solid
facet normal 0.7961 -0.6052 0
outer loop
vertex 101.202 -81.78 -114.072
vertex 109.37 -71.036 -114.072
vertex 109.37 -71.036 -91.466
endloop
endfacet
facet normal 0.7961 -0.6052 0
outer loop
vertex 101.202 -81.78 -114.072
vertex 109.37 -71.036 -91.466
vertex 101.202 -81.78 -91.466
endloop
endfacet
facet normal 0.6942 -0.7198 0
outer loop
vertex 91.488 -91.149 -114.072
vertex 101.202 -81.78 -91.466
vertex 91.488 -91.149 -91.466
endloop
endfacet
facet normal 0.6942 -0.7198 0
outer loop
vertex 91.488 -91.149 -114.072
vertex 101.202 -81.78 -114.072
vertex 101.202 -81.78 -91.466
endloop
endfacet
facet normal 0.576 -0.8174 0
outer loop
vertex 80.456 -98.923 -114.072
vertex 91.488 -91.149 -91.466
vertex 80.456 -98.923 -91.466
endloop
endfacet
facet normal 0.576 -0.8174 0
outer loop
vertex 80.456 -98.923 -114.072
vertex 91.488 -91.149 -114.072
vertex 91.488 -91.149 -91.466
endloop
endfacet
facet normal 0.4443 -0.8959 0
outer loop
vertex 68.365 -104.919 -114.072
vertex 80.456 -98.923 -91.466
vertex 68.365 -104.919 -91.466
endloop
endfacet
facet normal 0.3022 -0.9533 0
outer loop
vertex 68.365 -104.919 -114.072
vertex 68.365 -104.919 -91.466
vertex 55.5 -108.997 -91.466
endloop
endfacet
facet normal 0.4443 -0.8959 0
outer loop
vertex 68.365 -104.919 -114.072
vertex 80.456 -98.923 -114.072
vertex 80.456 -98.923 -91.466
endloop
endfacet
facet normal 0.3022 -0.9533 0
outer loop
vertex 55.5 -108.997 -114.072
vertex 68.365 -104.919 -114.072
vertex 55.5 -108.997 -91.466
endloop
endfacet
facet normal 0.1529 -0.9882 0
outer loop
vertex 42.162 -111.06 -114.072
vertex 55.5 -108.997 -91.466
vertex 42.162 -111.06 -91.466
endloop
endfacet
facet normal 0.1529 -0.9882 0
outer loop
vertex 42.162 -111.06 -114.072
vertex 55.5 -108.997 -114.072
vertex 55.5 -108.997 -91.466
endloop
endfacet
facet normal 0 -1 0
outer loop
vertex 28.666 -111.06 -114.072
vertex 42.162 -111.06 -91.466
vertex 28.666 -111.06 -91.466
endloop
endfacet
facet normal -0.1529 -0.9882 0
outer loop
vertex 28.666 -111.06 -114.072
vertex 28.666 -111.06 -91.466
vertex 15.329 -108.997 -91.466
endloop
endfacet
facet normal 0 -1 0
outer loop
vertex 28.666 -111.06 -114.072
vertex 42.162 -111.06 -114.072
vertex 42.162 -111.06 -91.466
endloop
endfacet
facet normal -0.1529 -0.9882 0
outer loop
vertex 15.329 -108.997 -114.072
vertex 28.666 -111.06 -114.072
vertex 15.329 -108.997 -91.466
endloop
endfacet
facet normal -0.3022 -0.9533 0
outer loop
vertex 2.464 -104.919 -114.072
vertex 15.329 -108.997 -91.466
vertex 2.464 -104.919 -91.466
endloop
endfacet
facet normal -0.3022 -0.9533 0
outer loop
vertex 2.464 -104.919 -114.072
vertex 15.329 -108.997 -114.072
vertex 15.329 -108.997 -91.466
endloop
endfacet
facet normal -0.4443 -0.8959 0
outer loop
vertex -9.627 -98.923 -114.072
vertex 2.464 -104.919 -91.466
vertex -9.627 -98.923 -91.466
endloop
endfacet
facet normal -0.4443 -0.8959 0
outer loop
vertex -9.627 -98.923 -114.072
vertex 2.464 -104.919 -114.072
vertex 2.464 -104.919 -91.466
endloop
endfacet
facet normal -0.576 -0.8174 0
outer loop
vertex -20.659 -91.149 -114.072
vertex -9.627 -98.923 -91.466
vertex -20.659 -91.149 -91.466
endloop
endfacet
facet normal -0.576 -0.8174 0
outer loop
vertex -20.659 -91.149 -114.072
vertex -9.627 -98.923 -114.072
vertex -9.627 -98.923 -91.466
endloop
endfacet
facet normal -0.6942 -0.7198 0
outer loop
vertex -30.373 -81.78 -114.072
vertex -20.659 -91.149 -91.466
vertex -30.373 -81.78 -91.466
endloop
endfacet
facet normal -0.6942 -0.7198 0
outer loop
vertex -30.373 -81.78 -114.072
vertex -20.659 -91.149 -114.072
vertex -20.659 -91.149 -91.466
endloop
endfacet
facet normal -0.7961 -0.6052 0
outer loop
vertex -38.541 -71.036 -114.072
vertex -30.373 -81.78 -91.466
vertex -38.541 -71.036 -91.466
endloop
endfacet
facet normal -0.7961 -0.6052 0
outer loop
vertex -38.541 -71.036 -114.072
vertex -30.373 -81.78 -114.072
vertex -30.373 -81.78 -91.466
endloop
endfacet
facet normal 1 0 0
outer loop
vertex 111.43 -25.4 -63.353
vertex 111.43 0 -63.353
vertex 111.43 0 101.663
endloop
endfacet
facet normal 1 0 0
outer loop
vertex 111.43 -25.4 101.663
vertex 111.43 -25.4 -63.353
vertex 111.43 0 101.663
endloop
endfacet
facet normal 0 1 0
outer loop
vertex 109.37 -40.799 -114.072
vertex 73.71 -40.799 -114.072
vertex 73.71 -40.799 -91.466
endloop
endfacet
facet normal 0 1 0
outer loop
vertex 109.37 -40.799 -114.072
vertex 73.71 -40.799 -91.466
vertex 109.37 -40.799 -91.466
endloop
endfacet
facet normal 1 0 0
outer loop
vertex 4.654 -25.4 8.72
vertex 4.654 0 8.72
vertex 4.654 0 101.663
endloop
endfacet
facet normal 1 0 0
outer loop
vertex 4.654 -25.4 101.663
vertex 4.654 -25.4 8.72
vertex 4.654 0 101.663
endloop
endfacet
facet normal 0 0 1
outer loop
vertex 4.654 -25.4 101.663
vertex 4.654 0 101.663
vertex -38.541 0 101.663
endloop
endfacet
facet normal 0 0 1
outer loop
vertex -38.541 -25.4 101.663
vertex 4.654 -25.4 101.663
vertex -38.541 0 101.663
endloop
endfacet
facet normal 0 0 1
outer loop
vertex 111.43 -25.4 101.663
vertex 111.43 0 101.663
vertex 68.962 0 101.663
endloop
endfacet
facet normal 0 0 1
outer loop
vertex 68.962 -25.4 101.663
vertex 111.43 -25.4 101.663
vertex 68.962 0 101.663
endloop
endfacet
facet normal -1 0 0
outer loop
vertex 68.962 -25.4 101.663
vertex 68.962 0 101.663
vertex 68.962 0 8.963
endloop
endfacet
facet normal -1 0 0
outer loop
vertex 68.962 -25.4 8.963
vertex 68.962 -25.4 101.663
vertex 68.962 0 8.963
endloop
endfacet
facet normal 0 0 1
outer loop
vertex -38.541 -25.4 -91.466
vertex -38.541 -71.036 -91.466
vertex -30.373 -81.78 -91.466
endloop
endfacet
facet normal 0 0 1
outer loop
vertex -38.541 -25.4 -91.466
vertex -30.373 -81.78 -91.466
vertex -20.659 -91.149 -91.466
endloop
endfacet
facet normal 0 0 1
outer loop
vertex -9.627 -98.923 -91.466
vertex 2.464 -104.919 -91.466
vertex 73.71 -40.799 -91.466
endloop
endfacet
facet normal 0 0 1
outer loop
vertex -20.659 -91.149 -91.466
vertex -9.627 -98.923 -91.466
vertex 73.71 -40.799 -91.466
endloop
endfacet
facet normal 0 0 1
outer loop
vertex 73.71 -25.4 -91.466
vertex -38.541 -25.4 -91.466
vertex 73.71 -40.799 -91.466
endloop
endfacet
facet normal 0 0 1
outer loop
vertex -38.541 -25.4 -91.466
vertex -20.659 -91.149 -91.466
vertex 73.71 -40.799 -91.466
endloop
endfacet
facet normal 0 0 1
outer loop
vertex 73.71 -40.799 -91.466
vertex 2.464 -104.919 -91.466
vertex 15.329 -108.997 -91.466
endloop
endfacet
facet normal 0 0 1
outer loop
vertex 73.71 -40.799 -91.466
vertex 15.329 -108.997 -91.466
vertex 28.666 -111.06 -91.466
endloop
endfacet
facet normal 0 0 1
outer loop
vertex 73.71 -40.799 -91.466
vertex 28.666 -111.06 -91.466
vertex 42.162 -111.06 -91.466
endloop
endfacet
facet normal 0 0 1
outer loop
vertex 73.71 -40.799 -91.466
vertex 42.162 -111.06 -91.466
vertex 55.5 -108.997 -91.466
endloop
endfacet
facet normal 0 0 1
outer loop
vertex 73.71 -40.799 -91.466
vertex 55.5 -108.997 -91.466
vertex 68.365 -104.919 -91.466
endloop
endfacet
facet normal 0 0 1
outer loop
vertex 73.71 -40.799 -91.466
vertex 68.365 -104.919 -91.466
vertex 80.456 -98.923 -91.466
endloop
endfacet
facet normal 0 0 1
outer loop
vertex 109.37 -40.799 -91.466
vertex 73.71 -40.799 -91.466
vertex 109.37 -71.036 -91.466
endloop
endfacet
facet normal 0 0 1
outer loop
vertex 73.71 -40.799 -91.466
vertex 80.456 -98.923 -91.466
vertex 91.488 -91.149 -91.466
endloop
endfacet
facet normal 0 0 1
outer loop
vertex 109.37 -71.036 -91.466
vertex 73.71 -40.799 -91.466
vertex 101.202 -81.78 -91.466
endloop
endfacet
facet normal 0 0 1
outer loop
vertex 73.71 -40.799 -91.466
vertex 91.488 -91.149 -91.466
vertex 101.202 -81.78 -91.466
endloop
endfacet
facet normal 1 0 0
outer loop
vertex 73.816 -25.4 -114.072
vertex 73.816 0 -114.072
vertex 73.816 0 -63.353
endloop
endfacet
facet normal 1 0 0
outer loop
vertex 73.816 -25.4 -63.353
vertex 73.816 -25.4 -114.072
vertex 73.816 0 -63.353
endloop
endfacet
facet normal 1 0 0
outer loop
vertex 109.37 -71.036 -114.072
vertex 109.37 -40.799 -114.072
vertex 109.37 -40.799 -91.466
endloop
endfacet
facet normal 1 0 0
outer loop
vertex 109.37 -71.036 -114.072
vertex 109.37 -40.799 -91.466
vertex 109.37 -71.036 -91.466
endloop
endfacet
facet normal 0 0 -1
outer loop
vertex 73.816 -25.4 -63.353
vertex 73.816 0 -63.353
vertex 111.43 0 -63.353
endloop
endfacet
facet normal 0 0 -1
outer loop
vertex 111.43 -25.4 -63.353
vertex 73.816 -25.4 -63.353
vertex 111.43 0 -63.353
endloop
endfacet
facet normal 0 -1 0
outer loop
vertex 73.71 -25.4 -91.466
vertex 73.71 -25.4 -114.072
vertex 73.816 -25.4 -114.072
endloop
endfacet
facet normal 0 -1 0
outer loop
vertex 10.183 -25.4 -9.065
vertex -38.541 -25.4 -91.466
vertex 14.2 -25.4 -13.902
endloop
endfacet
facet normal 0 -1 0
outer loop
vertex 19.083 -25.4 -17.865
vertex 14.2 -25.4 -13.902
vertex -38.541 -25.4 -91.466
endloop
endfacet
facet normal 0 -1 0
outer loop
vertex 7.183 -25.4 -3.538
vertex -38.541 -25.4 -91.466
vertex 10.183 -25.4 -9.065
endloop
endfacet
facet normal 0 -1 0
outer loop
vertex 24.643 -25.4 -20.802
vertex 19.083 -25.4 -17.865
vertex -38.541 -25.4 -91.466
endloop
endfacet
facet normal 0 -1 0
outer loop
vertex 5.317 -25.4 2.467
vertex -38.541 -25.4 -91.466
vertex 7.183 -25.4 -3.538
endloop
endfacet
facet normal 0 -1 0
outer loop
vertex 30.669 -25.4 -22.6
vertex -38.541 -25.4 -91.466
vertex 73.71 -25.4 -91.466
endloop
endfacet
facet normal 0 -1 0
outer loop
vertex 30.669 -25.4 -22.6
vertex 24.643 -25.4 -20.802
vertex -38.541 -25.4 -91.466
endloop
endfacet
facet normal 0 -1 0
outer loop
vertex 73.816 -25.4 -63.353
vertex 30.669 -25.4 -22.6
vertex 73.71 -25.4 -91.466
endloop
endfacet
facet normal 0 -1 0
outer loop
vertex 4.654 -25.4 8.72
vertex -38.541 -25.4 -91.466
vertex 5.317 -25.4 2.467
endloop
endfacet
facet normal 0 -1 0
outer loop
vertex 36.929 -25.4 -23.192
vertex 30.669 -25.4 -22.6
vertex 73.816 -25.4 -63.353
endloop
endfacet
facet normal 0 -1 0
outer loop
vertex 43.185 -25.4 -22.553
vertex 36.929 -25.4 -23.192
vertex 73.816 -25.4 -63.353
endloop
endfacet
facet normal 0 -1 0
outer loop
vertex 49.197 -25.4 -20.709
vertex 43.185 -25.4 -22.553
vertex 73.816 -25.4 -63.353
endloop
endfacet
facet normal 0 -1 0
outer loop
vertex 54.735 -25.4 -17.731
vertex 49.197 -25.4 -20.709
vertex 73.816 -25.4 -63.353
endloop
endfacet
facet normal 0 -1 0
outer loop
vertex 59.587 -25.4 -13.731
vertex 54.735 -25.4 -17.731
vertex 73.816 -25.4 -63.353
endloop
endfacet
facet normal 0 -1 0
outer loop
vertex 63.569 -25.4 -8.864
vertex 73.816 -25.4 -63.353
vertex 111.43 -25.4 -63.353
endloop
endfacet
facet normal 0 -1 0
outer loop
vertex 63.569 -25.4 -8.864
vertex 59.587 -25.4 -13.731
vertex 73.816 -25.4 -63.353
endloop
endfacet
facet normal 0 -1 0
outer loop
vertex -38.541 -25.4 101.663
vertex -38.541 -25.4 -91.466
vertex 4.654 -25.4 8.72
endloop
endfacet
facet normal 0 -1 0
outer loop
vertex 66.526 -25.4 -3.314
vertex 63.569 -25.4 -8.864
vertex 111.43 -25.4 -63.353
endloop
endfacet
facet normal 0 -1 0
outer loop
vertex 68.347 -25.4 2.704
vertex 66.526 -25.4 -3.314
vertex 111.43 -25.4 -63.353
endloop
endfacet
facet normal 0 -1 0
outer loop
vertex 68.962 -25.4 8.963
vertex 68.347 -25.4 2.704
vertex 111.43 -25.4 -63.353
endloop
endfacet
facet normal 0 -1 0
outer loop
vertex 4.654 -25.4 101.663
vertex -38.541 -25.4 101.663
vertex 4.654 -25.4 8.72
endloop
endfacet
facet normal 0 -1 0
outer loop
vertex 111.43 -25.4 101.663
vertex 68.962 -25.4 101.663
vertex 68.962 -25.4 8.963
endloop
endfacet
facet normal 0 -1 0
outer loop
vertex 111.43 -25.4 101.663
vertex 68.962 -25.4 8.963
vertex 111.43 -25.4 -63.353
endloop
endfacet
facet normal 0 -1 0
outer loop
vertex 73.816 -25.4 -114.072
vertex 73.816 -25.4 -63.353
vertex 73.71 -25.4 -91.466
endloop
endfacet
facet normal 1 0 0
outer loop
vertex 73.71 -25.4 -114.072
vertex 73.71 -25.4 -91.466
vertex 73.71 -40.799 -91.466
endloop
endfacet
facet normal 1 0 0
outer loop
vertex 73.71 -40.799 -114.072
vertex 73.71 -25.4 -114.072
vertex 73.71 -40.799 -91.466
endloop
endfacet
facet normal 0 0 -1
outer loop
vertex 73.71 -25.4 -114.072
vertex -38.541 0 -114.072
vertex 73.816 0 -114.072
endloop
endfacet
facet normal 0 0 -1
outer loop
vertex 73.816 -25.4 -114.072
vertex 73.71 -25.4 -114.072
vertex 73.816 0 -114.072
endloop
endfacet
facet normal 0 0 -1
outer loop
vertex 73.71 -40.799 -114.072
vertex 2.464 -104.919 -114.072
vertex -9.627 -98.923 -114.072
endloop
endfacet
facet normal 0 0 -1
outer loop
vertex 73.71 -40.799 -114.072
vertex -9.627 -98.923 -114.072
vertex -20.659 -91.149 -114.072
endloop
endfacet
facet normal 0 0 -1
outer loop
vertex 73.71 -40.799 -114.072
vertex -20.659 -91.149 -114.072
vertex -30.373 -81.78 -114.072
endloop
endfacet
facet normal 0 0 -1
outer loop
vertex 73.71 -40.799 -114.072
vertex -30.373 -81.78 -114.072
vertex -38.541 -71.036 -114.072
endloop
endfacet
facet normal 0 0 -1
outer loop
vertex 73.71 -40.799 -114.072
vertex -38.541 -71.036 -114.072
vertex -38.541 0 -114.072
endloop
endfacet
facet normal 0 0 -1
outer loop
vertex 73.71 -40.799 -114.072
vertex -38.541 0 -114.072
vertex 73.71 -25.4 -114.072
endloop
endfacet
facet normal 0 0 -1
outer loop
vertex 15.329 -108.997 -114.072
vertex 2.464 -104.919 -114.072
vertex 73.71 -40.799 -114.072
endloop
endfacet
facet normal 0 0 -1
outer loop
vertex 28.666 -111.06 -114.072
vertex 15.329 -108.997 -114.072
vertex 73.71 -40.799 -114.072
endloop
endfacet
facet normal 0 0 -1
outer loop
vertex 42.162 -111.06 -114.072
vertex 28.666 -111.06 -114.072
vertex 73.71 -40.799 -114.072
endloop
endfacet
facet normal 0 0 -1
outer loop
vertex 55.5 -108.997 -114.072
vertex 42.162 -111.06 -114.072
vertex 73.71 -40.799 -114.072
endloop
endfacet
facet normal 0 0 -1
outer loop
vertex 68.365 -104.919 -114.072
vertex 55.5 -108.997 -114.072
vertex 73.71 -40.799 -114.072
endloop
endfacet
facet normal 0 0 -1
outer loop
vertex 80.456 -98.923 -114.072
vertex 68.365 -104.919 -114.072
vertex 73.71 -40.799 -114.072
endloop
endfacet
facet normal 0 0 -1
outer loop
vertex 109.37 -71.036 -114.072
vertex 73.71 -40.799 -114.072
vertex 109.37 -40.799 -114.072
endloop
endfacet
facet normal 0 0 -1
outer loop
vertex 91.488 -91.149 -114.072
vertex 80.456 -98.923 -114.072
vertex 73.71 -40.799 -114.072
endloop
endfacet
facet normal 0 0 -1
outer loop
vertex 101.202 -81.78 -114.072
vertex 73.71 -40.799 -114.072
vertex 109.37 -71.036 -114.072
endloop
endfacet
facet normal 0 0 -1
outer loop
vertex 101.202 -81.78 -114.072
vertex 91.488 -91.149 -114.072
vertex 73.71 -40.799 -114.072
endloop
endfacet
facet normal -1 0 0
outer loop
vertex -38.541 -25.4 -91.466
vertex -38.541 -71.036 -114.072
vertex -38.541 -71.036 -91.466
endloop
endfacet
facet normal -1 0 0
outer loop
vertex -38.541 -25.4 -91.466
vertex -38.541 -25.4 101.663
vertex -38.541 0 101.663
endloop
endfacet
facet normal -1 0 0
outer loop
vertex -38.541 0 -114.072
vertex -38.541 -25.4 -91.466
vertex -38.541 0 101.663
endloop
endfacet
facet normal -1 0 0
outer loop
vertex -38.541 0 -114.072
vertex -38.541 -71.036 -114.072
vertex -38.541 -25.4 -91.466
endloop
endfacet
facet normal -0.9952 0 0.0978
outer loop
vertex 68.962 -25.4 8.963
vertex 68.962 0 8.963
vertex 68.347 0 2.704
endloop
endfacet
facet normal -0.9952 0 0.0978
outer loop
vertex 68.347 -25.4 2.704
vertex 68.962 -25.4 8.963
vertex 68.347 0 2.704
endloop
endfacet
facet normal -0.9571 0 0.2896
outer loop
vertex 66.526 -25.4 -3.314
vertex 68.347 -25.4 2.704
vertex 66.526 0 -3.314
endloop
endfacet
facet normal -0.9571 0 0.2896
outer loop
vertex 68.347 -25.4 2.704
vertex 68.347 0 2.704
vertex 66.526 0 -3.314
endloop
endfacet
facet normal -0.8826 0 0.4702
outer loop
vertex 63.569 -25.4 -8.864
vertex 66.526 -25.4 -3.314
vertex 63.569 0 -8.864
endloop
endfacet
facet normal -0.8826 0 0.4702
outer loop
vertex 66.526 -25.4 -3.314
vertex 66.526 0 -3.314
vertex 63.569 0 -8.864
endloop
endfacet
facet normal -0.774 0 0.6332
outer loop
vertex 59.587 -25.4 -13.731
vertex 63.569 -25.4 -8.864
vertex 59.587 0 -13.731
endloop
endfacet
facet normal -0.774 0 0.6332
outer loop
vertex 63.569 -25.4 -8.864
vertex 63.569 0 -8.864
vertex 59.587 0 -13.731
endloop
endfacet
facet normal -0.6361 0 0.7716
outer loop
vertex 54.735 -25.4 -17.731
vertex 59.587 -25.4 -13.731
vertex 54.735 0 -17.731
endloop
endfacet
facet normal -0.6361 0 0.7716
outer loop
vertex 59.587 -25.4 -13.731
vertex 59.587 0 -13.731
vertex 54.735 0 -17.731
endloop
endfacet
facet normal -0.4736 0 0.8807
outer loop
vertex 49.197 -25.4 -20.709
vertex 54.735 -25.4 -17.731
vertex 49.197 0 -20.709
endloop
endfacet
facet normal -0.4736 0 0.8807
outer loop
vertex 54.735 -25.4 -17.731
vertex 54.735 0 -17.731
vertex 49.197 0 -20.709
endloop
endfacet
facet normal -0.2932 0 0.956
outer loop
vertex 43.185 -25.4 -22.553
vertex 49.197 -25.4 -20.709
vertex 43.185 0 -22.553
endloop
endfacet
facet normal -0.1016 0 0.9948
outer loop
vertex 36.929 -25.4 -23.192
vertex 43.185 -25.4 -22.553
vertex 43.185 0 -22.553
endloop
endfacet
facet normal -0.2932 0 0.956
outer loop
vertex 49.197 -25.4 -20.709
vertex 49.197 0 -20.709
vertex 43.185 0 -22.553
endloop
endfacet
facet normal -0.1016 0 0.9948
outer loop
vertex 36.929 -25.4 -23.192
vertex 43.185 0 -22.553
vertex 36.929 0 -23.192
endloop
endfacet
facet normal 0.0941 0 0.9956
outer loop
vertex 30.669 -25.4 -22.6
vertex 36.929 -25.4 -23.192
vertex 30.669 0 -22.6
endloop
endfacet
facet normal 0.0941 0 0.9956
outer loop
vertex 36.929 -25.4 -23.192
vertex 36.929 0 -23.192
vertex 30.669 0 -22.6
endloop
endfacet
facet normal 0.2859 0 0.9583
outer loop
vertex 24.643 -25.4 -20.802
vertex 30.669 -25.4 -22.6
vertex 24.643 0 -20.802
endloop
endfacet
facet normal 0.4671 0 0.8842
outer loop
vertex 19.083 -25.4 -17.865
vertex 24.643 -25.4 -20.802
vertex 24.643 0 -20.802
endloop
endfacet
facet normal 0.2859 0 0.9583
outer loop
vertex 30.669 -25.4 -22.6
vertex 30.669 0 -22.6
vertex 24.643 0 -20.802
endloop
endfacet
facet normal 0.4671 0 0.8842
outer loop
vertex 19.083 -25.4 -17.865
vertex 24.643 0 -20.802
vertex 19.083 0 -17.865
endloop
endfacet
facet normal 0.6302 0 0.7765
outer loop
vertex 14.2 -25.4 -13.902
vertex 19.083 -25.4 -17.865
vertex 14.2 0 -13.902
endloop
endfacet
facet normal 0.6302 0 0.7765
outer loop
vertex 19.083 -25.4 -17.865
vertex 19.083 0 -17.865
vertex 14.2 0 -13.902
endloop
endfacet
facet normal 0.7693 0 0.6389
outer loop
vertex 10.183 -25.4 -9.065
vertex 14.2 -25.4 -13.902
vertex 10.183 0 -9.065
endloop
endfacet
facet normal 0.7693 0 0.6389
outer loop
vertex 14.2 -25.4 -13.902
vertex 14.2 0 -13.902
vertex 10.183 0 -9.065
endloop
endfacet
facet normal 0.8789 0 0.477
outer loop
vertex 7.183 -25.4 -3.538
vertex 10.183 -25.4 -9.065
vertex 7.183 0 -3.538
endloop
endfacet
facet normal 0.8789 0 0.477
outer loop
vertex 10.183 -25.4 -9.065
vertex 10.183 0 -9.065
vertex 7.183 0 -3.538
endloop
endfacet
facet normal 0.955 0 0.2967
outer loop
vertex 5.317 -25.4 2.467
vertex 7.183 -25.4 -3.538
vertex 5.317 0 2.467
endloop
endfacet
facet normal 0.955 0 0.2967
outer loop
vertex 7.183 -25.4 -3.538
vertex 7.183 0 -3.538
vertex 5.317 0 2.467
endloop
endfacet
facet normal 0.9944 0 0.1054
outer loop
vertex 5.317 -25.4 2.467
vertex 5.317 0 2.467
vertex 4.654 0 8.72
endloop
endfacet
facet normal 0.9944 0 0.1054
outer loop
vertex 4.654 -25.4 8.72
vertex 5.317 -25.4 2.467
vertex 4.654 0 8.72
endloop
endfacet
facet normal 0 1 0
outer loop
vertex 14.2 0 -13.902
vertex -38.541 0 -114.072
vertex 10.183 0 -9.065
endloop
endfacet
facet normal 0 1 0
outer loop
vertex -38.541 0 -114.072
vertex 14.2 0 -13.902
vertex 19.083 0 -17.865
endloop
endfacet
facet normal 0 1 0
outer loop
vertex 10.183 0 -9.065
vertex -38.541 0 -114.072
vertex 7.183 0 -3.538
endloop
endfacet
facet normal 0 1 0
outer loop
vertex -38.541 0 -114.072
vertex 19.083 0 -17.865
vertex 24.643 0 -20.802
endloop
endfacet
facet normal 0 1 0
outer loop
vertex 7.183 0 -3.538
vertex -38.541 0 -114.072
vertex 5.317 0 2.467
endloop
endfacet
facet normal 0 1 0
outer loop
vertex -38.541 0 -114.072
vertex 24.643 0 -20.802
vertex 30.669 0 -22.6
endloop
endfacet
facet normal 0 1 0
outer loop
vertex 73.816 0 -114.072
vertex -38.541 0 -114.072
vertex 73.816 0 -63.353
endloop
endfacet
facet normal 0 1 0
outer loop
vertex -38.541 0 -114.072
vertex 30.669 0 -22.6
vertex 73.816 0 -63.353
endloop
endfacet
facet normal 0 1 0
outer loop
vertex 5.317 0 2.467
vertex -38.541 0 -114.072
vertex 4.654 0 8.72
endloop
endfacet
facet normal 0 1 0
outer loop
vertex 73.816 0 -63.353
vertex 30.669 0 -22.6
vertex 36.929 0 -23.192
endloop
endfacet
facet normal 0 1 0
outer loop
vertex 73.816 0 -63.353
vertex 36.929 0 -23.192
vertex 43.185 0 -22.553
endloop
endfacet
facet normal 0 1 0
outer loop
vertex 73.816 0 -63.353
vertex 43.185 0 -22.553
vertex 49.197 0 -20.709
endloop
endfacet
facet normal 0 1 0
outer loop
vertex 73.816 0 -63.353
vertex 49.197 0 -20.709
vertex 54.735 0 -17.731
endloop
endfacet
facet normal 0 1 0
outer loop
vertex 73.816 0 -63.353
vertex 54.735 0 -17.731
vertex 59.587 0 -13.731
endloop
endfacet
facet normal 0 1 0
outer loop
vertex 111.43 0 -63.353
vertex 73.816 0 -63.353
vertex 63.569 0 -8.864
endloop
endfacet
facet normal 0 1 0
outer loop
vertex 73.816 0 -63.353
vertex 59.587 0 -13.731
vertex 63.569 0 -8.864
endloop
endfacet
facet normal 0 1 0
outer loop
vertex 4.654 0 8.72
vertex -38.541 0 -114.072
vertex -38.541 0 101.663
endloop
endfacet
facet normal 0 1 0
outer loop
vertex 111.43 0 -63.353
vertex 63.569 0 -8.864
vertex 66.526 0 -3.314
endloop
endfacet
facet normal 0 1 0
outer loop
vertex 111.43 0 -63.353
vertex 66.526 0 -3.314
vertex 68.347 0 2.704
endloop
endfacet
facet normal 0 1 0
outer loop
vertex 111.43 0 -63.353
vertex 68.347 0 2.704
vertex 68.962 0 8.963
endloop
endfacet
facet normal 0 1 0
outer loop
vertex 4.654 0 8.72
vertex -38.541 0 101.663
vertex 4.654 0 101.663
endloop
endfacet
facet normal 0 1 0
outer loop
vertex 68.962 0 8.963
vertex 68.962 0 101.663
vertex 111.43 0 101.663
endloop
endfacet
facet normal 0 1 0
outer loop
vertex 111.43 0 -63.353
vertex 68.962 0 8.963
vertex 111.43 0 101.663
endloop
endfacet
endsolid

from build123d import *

# Parameters (mm, degrees)
F1_DEPTH = 25.4
F3_DEPTH = 22.606


with BuildPart() as f1:
    # F0 (on Front) → F1 (new body)
    with BuildSketch(Plane.XZ):
        with BuildLine():
            Line((4.654405, 101.662926), (-38.54106, 101.662926))
            Line((-38.54106, 101.662926), (-38.54106, -114.071727))
            Line((-38.54106, -114.071727), (73.815681, -114.071727))
            Line((73.815681, -114.071727), (73.815681, -63.353464))
            Line((73.815681, -63.353464), (111.429714, -63.353464))
            Line((111.429714, -63.353464), (111.429714, 101.662926))
            Line((111.429714, 101.662926), (68.962261, 101.662926))
            Line((68.962261, 101.662926), (68.962261, 8.962544))
            ThreePointArc((68.962261, 8.962544), (36.929212, -23.191613), (4.654405, 8.719872))
            Line((4.654405, 8.719872), (4.654405, 101.662926))
        make_face()
    extrude(amount=F1_DEPTH)

    # F2 (on face) → F3 (join)
    with BuildSketch(Plane(origin=(0, 0, -114.071727), x_dir=(1, 0, 0), z_dir=(0, 0, -1))):
        with BuildLine():
            Line((-38.54106, 71.035914), (-38.54106, 0))
            Line((-38.54106, 0), (73.70951, 0))
            Line((73.70951, 0), (73.70951, 40.798619))
            Line((73.70951, 40.798619), (109.369531, 40.798619))
            Line((109.369531, 40.798619), (109.369531, 71.035914))
            ThreePointArc((109.369531, 71.035914), (35.414236, 111.318798), (-38.54106, 71.035914))
        make_face()
    extrude(amount=-F3_DEPTH)


solid = f1.part
